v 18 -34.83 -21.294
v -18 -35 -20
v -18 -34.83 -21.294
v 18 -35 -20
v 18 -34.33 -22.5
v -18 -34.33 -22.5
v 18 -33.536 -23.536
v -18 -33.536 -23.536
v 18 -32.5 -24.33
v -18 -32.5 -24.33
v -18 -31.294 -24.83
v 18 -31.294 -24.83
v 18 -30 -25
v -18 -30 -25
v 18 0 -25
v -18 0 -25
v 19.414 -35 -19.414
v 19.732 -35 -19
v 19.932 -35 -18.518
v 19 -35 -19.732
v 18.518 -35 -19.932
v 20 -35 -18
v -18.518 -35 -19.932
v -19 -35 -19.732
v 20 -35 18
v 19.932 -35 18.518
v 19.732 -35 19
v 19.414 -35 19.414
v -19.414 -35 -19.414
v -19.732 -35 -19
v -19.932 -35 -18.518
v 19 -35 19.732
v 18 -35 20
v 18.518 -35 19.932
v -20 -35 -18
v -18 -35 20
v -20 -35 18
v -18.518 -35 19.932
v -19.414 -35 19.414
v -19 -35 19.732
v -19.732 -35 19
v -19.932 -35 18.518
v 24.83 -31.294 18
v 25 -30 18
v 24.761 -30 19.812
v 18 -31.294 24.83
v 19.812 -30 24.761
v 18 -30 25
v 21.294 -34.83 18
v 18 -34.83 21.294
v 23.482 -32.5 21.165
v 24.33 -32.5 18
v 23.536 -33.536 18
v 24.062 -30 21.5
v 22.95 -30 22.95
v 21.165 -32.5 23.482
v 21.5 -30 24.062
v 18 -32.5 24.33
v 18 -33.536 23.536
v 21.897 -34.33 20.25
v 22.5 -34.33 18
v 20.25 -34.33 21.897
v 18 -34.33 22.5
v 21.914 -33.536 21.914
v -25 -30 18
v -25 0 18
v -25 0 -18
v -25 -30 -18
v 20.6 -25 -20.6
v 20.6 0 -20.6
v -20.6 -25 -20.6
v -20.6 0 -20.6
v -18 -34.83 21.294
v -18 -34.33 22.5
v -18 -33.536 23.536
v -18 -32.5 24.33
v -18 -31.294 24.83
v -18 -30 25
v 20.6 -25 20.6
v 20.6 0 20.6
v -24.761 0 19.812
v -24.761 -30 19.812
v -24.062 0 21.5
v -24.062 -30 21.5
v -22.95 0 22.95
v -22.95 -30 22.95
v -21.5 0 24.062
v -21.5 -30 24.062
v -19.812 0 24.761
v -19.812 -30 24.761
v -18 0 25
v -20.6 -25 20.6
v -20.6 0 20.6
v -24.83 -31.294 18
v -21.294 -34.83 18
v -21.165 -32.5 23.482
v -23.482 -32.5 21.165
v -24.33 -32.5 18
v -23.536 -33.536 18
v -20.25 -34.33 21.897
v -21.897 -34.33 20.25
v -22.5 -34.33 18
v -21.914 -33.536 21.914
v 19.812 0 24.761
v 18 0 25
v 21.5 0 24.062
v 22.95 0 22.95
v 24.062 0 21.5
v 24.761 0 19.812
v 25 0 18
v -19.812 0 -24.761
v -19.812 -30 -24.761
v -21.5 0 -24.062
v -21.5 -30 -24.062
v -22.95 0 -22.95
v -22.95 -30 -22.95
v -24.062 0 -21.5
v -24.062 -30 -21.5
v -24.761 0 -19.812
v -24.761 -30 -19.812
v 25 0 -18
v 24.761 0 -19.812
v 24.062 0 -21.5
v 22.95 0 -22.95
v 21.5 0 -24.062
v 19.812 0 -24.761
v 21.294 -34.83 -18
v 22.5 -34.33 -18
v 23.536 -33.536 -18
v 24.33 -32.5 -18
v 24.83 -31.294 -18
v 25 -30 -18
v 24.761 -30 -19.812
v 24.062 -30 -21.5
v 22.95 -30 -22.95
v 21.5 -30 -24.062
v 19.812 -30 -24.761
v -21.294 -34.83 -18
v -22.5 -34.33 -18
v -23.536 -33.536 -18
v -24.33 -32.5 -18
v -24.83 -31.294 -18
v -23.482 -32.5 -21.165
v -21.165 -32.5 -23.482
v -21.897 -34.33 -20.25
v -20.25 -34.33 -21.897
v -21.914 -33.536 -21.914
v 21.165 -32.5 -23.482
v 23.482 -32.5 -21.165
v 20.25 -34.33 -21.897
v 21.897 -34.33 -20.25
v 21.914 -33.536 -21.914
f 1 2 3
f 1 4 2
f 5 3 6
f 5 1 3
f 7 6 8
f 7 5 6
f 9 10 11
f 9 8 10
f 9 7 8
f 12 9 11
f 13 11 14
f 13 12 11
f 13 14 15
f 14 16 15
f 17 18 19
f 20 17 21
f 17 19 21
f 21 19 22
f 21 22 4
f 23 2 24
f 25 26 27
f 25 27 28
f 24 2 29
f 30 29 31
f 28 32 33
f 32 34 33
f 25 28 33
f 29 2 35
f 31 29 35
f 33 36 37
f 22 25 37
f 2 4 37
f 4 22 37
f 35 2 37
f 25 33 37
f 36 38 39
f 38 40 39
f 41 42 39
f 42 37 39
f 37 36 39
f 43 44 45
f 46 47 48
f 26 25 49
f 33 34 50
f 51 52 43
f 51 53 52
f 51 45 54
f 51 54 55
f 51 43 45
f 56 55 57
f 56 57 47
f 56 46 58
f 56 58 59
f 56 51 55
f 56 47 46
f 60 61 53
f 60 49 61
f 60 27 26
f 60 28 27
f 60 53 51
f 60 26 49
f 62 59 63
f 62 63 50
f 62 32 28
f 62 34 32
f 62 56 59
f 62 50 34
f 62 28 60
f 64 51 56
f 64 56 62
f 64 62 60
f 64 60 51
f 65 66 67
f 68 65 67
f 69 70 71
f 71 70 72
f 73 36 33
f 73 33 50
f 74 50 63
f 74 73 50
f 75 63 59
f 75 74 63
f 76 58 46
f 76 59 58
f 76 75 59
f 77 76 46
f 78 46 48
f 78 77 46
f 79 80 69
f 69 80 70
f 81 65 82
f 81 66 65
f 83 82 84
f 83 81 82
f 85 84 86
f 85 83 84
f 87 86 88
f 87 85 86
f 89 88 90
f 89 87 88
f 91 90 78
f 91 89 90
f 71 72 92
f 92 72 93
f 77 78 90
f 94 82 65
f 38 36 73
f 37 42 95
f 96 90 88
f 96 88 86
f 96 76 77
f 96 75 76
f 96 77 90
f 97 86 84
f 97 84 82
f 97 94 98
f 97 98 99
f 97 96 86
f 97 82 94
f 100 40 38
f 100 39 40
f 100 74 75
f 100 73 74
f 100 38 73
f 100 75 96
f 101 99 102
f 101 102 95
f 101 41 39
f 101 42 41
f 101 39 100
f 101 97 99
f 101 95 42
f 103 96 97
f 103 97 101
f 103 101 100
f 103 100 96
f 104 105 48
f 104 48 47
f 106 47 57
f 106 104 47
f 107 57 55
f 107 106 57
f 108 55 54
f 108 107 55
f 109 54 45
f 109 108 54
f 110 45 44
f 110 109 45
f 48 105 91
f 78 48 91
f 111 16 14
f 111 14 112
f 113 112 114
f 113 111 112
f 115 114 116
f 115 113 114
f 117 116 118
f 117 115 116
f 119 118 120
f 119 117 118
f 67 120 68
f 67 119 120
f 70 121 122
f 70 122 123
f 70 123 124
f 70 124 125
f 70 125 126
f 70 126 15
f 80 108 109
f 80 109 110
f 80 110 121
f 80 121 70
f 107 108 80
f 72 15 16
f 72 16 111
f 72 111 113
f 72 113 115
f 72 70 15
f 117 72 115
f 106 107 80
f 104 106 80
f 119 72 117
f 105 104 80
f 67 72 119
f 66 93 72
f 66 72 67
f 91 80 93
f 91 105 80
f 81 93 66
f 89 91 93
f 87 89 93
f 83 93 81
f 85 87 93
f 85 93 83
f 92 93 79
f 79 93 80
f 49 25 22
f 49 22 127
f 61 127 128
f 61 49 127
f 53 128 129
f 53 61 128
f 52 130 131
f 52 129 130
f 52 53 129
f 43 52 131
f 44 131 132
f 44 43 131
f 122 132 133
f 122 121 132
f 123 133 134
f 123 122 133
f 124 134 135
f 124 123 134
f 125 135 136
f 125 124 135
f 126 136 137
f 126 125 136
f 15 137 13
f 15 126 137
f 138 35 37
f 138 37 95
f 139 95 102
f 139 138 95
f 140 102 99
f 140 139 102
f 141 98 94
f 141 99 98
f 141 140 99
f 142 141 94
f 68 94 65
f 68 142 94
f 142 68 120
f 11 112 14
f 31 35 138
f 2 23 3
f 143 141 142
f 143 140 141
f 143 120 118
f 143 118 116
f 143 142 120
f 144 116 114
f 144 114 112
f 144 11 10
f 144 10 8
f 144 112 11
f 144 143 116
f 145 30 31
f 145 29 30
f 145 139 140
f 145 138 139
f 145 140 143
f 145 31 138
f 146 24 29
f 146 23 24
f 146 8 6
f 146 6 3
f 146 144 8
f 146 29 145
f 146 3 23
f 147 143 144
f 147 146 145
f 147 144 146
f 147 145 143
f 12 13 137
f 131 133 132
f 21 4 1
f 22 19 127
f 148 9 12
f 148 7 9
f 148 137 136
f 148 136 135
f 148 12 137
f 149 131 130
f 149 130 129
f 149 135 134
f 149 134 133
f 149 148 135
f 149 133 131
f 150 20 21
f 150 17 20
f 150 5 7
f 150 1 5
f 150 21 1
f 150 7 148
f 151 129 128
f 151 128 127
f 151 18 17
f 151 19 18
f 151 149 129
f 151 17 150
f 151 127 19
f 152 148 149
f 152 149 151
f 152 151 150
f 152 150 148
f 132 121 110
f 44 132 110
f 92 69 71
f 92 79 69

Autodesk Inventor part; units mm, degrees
ref_plane "YZ Plane" through (0, 0, 0) normal (1, 0, 0) x (0, 1, 0)
ref_plane "XZ Plane" through (0, 0, 0) normal (0, 1, 0) x (-1, 0, 0)
ref_plane "XY Plane" through (0, 0, 0) normal (0, 0, 1) x (1, 0, 0)
sketch "Sketch1" plane through (0, 0, 0) normal (0, 1, 0) x (-1, 0, 0)
  line L0 (-18, 25) -> (18, 25)
  line L1 (25, 18) -> (25, -18)
  line L2 (18, -25) -> (-18, -25)
  line L3 (-25, -18) -> (-25, 18)
  line L4 (-25, 25) -> (25, -25) construction
  line L5 (25, 25) -> (-25, -25) construction
  circle A0 centre (0, 0) radius 2.75
  arc A1 (25, 18) -> (18, 25) centre (18, 18) ccw
  arc A2 (18, -25) -> (25, -18) centre (18, -18) ccw
  arc A3 (-25, -18) -> (-18, -25) centre (-18, -18) ccw
  arc A4 (-18, 25) -> (-25, 18) centre (-18, 18) ccw
  line L6 (-20.2, 20.2) -> (20.2, 20.2)
  line L7 (20.2, 20.2) -> (20.2, -20.2)
  line L8 (20.2, -20.2) -> (-20.2, -20.2)
  line L9 (-20.2, -20.2) -> (-20.2, 20.2)
  line L10 (-20.2, 20.2) -> (20.2, -20.2) construction
  line L11 (20.2, 20.2) -> (-20.2, -20.2) construction
  line L12 (20.6, -20.6) -> (20.6, 20.6)
  line L13 (20.6, 20.6) -> (-20.6, 20.6)
  line L14 (-20.6, 20.6) -> (-20.6, -20.6)
  line L15 (-20.6, -20.6) -> (20.6, -20.6)
  dimension "d0" = 50
  dimension "d1" = 50
  dimension "d2" = 5.5
  dimension "d3" = 7
  dimension "d4" = 40.4
  dimension "d5" = 40.4
  dimension "d8" = 0.4
extrude "Extrusion1" add sketch "Sketch1" against normal blind 35 contours L0 A1 L1 A2 L2 A3 L3 A4 | A0 | L6 L7 L8 L9 | L15 L14 L13 L12
fillet "Fillet1" radius 5 8 edges at (0, -35, 25) (-22.9497, -35, 22.9497) (-25, -35, 0) (-22.9497, -35, -22.9497) (0, -35, -25) (22.9497, -35, -22.9497) (25, -35, 0) (22.9497, -35, 22.9497)
extrude "Extrusion2" cut sketch "Sketch1" against normal blind 25 contours A0 | L6 L7 L8 L9 | L15 L14 L13 L12
sketch "Sketch2" plane through (0, -35, 0) normal (0, -1, 0) x (1, 0, 0)
  circle A0 centre (0, 0) radius 2.75 projected
  line L0 (-10.5, 12.5) -> (10.5, 12.5) projected
  arc A1 (-10.5, 12.5) -> (-12.5, 10.5) centre (-10.5, 10.5) ccw projected
  line L1 (-12.5, -10.5) -> (-12.5, 10.5) projected
  arc A2 (-12.5, -10.5) -> (-10.5, -12.5) centre (-10.5, -10.5) ccw projected
  line L2 (10.5, -12.5) -> (-10.5, -12.5) projected
  arc A3 (10.5, -12.5) -> (12.5, -10.5) centre (10.5, -10.5) ccw projected
  line L3 (12.5, 10.5) -> (12.5, -10.5) projected
  arc A4 (12.5, 10.5) -> (10.5, 12.5) centre (10.5, 10.5) ccw projected
  circle A5 centre (0, 0) radius 5
  dimension "d12" = 10
properties part number "PATA_PLASTICO" material "Steel, Mild, Welded"
